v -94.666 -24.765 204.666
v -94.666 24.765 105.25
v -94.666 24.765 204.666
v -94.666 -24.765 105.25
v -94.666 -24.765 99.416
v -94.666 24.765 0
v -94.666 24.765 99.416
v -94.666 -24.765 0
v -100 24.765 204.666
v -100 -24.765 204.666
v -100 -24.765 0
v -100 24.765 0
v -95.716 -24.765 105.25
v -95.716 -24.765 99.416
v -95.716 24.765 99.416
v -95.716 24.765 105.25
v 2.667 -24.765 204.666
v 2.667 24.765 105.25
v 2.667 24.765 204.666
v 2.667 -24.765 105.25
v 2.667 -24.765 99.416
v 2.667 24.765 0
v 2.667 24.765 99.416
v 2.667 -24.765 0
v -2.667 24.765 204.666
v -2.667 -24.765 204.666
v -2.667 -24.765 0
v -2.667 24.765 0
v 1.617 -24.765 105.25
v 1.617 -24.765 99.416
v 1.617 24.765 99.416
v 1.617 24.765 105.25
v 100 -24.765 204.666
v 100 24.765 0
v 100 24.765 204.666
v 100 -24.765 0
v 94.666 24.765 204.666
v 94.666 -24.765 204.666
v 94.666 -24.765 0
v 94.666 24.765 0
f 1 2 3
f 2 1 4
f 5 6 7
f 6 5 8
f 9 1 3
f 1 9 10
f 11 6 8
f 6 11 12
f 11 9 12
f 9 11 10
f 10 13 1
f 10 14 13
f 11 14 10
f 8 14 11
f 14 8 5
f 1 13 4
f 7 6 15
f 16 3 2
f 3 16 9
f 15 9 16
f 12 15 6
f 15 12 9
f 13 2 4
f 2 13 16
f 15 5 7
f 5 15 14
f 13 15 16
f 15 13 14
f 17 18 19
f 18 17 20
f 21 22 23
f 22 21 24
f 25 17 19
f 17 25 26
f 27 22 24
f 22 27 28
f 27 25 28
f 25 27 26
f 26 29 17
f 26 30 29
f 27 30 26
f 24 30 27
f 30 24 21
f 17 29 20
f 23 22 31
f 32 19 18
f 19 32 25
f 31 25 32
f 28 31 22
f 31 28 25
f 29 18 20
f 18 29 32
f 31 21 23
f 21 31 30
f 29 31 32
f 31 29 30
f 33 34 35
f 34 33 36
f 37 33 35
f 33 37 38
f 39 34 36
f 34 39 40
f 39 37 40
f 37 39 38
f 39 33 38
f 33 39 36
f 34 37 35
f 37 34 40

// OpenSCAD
// file: selfleg.scad
module selfleg(leg_length =205, self_n_woods=4, 
    wood_thickness=5, wood_width=15, 
    groove_depth=1, groove_height = 6, 
    first_leg=false, last_leg=false)
{
    self_depth = wood_width * self_n_woods;
    
    translate([0,0,leg_length/2])
    {
        difference()
        {
            for (y = [0:self_n_woods-1])
            {
                yy = y * wood_width - self_depth/2 + wood_width/2; 
                
                color([0.01 * rands(60,80,1)[0],
                    0.01 * rands(30,50,1)[0],
                    0.01 * rands(0,20,1)[0]])
                translate([0,yy,0])
                cube([wood_thickness, wood_width, leg_length],center=true);
            }
        
            if (!last_leg) {
                translate([wood_thickness/2-groove_depth/2,0,0])
                color([0.5,0.3,0.1])
                    cube([groove_depth+0.1, self_depth+0.1, 
                        groove_height],center=true);
            }
        }
    }
}

selfleg();
// main file
use <selfleg.scad> 
self_width = 200;
self_height = 210;
divs = 2;
self_n_woods = 3;
wood_thickness = 2.1 * 2.54;
wood_width = 6.5 * 2.54;
groove_depth = 1;
groove_height = wood_thickness + 0.5;



module self() 
{
    xstep = (self_width - wood_thickness) / divs;
    for (x=[0:divs])
    {
        xx = x * xstep - (self_width-wood_thickness)/2;
        first_leg = (x == 0);
        last_leg = (x == divs);
        
        translate([xx,0,0])
            selfleg(self_height - wood_thickness, self_n_woods, 
                wood_thickness, wood_width, 
                groove_depth, groove_height, 
                first_leg, last_leg);
    }
}

self();
